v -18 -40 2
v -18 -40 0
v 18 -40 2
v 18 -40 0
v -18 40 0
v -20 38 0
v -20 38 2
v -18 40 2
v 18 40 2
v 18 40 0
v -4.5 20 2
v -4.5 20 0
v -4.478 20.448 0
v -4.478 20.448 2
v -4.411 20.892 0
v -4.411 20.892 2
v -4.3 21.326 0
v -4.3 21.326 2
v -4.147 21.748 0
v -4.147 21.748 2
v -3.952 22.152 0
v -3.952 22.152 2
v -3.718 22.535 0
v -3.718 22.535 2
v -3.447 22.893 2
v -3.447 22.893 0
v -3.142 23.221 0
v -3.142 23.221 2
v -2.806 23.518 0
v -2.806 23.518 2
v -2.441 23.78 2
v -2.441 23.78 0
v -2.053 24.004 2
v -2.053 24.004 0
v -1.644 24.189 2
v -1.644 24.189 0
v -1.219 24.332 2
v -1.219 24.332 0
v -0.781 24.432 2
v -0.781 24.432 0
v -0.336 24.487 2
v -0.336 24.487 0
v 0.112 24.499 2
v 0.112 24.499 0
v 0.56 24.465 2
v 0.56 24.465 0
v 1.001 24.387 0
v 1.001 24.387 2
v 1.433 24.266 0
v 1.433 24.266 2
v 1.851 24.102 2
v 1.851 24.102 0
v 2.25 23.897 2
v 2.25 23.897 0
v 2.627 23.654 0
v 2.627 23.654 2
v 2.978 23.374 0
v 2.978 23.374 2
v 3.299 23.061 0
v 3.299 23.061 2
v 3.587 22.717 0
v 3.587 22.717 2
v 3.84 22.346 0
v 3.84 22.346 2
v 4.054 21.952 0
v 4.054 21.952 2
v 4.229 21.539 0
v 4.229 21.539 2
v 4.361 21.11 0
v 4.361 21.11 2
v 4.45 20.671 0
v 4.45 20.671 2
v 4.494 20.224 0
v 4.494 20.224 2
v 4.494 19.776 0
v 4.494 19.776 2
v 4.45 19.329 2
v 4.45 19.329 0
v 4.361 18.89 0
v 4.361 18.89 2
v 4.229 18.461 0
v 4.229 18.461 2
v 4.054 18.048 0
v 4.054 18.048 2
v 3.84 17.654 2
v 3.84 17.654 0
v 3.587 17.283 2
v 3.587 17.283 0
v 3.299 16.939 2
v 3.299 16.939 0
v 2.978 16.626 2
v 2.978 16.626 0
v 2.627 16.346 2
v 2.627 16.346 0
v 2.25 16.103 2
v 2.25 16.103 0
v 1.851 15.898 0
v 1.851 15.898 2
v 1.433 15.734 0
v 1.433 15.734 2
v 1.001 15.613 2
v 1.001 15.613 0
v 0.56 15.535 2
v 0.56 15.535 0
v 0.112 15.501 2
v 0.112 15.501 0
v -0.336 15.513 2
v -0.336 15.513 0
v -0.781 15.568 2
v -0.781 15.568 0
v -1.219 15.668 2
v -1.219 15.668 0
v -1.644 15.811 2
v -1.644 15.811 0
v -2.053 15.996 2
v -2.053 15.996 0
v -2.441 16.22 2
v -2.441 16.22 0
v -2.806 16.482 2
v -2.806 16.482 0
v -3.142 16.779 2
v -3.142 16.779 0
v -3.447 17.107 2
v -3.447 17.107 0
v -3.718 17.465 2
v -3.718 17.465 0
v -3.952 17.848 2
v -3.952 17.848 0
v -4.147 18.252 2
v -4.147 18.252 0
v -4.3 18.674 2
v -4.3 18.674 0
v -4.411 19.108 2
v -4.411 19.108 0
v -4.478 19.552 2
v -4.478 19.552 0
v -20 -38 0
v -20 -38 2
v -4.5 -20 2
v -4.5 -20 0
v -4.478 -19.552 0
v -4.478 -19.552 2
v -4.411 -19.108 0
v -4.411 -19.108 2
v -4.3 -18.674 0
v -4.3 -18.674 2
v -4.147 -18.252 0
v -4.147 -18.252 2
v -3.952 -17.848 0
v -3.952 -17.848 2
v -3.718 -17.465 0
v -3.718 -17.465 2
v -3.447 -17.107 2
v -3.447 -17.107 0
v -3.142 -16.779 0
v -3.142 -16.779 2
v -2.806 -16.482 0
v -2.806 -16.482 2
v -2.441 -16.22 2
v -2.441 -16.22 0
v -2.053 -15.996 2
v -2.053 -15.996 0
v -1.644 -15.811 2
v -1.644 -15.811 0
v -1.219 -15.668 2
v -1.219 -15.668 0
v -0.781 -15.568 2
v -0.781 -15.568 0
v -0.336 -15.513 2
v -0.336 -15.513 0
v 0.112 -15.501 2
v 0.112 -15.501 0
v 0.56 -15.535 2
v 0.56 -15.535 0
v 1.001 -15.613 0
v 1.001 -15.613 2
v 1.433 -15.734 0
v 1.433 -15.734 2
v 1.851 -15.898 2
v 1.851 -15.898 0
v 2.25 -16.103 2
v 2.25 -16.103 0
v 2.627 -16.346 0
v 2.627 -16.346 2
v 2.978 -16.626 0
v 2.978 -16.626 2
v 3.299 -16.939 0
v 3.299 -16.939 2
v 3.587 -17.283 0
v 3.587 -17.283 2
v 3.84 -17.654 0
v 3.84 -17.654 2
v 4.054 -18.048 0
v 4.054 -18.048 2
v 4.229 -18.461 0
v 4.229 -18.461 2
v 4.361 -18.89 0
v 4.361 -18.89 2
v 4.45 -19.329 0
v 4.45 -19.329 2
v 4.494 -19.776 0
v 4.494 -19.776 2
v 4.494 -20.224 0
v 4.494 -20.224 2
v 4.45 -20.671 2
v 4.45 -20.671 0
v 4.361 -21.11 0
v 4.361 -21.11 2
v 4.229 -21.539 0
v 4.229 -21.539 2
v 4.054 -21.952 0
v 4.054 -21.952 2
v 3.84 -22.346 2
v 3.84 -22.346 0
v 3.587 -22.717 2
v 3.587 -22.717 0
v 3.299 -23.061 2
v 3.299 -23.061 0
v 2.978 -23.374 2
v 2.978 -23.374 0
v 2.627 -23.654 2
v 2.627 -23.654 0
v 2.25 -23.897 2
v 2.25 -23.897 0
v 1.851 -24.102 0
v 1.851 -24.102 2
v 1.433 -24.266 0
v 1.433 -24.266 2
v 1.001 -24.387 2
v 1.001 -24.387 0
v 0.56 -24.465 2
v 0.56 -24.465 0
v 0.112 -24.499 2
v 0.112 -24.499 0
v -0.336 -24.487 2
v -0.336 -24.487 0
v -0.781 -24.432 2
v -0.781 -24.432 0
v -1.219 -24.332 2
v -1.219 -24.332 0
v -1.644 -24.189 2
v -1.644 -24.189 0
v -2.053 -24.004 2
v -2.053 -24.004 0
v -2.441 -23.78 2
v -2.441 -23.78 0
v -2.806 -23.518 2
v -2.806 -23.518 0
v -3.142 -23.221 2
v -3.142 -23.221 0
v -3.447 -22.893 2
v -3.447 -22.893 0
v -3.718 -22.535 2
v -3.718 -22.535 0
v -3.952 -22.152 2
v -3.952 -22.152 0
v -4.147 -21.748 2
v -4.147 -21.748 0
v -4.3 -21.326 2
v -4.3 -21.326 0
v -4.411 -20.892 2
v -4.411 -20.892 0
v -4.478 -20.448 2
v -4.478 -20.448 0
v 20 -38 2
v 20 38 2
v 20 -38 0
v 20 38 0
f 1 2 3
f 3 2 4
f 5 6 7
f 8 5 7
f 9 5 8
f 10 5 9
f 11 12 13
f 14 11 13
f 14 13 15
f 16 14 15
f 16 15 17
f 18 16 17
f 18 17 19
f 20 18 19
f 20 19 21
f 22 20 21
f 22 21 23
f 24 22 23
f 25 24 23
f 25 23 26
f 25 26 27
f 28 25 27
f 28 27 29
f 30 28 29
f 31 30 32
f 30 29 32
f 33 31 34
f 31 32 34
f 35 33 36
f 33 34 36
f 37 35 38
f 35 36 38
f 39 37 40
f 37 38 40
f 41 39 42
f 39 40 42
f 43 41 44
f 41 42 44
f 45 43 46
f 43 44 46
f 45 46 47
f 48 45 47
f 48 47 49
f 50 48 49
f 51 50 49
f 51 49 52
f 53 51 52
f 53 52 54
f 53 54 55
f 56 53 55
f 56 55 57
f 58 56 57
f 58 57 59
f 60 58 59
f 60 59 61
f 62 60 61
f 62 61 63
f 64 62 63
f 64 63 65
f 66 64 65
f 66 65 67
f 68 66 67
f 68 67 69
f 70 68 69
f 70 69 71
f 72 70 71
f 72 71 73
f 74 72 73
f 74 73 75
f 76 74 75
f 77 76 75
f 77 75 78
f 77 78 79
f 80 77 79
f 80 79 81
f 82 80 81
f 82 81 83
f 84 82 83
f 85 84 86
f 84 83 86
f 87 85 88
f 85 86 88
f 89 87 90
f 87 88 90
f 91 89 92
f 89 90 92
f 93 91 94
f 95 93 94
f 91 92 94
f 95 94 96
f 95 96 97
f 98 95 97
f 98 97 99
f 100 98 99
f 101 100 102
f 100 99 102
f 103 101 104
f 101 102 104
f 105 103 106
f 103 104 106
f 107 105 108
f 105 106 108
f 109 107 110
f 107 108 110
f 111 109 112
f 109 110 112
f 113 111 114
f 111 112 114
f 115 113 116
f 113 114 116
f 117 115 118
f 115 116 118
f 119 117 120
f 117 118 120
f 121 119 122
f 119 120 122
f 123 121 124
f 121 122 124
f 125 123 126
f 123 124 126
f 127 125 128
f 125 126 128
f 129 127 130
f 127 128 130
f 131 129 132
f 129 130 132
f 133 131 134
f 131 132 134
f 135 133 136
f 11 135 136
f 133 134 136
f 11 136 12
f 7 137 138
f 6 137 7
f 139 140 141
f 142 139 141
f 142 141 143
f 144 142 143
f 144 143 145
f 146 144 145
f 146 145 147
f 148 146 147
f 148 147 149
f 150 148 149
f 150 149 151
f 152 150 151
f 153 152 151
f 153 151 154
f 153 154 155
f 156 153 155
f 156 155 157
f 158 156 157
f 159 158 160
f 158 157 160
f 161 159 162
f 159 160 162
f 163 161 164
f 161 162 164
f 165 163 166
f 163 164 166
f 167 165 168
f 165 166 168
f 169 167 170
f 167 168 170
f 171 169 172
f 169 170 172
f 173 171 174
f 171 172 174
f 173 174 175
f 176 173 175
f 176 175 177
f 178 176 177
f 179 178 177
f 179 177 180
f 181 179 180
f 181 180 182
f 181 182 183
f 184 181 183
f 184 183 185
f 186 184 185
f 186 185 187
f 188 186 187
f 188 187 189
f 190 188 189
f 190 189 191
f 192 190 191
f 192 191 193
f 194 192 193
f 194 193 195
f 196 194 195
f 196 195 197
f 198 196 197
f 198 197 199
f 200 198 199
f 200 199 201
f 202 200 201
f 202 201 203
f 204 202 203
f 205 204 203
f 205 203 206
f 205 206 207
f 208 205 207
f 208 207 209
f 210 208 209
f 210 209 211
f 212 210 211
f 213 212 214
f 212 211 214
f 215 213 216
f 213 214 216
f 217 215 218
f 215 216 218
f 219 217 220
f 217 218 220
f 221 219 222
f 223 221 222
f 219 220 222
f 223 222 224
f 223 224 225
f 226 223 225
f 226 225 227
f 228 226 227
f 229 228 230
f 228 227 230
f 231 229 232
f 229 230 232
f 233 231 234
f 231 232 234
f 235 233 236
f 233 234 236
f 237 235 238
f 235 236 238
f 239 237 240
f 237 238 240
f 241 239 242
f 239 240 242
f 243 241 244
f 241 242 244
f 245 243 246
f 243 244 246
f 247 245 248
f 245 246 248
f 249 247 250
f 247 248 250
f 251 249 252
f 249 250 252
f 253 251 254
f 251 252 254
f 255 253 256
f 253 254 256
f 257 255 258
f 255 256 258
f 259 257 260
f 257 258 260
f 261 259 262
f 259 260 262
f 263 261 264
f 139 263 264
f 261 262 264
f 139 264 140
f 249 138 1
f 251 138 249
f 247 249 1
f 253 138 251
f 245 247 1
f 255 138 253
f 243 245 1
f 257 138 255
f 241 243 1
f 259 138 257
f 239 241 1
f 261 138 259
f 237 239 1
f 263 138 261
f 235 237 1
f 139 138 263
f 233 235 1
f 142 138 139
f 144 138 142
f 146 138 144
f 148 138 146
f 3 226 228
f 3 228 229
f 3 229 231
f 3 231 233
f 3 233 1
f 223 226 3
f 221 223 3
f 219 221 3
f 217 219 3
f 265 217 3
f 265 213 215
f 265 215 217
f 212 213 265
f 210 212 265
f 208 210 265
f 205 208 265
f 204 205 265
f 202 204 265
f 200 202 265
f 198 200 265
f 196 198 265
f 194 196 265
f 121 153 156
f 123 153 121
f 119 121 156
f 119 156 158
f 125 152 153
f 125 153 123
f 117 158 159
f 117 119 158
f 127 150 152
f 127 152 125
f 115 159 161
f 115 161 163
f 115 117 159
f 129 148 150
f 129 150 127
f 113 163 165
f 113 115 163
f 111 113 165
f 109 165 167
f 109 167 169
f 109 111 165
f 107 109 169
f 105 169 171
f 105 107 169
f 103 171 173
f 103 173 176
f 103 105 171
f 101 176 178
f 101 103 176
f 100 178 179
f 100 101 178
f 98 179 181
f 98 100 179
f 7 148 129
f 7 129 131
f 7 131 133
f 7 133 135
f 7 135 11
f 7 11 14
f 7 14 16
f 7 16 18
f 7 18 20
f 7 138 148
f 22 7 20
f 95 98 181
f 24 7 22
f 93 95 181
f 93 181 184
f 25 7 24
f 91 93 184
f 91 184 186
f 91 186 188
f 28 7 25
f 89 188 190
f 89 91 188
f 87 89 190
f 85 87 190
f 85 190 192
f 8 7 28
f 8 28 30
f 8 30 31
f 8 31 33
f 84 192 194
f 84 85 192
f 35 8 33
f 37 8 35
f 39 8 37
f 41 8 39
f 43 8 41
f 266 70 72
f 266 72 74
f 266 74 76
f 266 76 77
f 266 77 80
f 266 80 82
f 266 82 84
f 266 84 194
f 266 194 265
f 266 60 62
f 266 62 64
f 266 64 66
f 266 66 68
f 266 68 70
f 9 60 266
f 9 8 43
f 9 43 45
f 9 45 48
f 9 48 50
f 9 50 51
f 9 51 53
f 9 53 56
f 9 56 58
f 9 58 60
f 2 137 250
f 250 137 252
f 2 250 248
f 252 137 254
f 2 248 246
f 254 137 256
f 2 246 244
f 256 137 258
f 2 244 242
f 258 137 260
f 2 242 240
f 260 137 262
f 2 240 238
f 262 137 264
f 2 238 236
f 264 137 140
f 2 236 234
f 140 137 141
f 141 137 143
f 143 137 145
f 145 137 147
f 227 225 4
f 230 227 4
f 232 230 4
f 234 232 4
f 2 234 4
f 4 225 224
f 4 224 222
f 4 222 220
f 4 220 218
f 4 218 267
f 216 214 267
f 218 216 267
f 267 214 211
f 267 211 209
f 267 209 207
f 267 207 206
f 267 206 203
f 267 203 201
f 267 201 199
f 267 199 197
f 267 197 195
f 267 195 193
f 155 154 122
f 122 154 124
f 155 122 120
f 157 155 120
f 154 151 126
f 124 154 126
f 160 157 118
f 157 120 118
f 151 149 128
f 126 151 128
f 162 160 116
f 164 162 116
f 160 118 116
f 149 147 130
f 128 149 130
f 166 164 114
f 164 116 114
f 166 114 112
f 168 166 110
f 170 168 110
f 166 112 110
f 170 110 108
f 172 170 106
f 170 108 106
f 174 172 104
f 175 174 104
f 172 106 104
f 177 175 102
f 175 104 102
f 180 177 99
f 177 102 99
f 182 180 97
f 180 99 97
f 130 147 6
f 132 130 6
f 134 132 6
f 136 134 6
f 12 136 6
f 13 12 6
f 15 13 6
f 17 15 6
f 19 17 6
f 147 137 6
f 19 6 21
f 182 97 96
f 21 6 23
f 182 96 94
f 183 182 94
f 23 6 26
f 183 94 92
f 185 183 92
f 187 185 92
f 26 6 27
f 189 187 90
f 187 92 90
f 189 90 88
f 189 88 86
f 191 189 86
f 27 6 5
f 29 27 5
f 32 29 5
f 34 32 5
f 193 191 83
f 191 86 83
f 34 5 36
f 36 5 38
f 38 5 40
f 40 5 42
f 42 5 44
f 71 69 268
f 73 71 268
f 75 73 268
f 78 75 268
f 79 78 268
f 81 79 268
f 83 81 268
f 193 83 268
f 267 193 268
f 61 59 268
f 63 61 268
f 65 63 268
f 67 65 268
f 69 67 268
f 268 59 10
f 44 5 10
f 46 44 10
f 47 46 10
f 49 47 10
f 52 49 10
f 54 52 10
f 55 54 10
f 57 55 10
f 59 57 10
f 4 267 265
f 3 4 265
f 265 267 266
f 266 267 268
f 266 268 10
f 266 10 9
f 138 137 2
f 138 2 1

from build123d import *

# Parameters (mm, degrees)
SKETCH_1_W        = 40
SKETCH_1_H        = 80
EXTRUDE_1_DEPTH   = 2
CHAMFER_1_SIZE    = 2
HOLE_WIZARD_M81_D = 9


with BuildPart() as part:
    # Эскиз1 → Бобышка-Вытянуть1 (new body)
    with BuildSketch(Plane.XY):
        Rectangle(SKETCH_1_W, SKETCH_1_H)
    extrude(amount=EXTRUDE_1_DEPTH)

    # Фаска1
    chamfer_1_edges = [part.edges().sort_by_distance(p)[0] for p in [
        (20, -40, 1),
        (-20, -40, 1),
        (-20, 40, 1),
        (20, 40, 1),
    ]]
    chamfer(chamfer_1_edges, length=CHAMFER_1_SIZE)

    # Отверстие с зазором M81 (through all)
    with Locations(Plane.XY.offset(2)):
        with Locations((0, -20), (0, 20)):
            Hole(HOLE_WIZARD_M81_D / 2)


solid = part.part
